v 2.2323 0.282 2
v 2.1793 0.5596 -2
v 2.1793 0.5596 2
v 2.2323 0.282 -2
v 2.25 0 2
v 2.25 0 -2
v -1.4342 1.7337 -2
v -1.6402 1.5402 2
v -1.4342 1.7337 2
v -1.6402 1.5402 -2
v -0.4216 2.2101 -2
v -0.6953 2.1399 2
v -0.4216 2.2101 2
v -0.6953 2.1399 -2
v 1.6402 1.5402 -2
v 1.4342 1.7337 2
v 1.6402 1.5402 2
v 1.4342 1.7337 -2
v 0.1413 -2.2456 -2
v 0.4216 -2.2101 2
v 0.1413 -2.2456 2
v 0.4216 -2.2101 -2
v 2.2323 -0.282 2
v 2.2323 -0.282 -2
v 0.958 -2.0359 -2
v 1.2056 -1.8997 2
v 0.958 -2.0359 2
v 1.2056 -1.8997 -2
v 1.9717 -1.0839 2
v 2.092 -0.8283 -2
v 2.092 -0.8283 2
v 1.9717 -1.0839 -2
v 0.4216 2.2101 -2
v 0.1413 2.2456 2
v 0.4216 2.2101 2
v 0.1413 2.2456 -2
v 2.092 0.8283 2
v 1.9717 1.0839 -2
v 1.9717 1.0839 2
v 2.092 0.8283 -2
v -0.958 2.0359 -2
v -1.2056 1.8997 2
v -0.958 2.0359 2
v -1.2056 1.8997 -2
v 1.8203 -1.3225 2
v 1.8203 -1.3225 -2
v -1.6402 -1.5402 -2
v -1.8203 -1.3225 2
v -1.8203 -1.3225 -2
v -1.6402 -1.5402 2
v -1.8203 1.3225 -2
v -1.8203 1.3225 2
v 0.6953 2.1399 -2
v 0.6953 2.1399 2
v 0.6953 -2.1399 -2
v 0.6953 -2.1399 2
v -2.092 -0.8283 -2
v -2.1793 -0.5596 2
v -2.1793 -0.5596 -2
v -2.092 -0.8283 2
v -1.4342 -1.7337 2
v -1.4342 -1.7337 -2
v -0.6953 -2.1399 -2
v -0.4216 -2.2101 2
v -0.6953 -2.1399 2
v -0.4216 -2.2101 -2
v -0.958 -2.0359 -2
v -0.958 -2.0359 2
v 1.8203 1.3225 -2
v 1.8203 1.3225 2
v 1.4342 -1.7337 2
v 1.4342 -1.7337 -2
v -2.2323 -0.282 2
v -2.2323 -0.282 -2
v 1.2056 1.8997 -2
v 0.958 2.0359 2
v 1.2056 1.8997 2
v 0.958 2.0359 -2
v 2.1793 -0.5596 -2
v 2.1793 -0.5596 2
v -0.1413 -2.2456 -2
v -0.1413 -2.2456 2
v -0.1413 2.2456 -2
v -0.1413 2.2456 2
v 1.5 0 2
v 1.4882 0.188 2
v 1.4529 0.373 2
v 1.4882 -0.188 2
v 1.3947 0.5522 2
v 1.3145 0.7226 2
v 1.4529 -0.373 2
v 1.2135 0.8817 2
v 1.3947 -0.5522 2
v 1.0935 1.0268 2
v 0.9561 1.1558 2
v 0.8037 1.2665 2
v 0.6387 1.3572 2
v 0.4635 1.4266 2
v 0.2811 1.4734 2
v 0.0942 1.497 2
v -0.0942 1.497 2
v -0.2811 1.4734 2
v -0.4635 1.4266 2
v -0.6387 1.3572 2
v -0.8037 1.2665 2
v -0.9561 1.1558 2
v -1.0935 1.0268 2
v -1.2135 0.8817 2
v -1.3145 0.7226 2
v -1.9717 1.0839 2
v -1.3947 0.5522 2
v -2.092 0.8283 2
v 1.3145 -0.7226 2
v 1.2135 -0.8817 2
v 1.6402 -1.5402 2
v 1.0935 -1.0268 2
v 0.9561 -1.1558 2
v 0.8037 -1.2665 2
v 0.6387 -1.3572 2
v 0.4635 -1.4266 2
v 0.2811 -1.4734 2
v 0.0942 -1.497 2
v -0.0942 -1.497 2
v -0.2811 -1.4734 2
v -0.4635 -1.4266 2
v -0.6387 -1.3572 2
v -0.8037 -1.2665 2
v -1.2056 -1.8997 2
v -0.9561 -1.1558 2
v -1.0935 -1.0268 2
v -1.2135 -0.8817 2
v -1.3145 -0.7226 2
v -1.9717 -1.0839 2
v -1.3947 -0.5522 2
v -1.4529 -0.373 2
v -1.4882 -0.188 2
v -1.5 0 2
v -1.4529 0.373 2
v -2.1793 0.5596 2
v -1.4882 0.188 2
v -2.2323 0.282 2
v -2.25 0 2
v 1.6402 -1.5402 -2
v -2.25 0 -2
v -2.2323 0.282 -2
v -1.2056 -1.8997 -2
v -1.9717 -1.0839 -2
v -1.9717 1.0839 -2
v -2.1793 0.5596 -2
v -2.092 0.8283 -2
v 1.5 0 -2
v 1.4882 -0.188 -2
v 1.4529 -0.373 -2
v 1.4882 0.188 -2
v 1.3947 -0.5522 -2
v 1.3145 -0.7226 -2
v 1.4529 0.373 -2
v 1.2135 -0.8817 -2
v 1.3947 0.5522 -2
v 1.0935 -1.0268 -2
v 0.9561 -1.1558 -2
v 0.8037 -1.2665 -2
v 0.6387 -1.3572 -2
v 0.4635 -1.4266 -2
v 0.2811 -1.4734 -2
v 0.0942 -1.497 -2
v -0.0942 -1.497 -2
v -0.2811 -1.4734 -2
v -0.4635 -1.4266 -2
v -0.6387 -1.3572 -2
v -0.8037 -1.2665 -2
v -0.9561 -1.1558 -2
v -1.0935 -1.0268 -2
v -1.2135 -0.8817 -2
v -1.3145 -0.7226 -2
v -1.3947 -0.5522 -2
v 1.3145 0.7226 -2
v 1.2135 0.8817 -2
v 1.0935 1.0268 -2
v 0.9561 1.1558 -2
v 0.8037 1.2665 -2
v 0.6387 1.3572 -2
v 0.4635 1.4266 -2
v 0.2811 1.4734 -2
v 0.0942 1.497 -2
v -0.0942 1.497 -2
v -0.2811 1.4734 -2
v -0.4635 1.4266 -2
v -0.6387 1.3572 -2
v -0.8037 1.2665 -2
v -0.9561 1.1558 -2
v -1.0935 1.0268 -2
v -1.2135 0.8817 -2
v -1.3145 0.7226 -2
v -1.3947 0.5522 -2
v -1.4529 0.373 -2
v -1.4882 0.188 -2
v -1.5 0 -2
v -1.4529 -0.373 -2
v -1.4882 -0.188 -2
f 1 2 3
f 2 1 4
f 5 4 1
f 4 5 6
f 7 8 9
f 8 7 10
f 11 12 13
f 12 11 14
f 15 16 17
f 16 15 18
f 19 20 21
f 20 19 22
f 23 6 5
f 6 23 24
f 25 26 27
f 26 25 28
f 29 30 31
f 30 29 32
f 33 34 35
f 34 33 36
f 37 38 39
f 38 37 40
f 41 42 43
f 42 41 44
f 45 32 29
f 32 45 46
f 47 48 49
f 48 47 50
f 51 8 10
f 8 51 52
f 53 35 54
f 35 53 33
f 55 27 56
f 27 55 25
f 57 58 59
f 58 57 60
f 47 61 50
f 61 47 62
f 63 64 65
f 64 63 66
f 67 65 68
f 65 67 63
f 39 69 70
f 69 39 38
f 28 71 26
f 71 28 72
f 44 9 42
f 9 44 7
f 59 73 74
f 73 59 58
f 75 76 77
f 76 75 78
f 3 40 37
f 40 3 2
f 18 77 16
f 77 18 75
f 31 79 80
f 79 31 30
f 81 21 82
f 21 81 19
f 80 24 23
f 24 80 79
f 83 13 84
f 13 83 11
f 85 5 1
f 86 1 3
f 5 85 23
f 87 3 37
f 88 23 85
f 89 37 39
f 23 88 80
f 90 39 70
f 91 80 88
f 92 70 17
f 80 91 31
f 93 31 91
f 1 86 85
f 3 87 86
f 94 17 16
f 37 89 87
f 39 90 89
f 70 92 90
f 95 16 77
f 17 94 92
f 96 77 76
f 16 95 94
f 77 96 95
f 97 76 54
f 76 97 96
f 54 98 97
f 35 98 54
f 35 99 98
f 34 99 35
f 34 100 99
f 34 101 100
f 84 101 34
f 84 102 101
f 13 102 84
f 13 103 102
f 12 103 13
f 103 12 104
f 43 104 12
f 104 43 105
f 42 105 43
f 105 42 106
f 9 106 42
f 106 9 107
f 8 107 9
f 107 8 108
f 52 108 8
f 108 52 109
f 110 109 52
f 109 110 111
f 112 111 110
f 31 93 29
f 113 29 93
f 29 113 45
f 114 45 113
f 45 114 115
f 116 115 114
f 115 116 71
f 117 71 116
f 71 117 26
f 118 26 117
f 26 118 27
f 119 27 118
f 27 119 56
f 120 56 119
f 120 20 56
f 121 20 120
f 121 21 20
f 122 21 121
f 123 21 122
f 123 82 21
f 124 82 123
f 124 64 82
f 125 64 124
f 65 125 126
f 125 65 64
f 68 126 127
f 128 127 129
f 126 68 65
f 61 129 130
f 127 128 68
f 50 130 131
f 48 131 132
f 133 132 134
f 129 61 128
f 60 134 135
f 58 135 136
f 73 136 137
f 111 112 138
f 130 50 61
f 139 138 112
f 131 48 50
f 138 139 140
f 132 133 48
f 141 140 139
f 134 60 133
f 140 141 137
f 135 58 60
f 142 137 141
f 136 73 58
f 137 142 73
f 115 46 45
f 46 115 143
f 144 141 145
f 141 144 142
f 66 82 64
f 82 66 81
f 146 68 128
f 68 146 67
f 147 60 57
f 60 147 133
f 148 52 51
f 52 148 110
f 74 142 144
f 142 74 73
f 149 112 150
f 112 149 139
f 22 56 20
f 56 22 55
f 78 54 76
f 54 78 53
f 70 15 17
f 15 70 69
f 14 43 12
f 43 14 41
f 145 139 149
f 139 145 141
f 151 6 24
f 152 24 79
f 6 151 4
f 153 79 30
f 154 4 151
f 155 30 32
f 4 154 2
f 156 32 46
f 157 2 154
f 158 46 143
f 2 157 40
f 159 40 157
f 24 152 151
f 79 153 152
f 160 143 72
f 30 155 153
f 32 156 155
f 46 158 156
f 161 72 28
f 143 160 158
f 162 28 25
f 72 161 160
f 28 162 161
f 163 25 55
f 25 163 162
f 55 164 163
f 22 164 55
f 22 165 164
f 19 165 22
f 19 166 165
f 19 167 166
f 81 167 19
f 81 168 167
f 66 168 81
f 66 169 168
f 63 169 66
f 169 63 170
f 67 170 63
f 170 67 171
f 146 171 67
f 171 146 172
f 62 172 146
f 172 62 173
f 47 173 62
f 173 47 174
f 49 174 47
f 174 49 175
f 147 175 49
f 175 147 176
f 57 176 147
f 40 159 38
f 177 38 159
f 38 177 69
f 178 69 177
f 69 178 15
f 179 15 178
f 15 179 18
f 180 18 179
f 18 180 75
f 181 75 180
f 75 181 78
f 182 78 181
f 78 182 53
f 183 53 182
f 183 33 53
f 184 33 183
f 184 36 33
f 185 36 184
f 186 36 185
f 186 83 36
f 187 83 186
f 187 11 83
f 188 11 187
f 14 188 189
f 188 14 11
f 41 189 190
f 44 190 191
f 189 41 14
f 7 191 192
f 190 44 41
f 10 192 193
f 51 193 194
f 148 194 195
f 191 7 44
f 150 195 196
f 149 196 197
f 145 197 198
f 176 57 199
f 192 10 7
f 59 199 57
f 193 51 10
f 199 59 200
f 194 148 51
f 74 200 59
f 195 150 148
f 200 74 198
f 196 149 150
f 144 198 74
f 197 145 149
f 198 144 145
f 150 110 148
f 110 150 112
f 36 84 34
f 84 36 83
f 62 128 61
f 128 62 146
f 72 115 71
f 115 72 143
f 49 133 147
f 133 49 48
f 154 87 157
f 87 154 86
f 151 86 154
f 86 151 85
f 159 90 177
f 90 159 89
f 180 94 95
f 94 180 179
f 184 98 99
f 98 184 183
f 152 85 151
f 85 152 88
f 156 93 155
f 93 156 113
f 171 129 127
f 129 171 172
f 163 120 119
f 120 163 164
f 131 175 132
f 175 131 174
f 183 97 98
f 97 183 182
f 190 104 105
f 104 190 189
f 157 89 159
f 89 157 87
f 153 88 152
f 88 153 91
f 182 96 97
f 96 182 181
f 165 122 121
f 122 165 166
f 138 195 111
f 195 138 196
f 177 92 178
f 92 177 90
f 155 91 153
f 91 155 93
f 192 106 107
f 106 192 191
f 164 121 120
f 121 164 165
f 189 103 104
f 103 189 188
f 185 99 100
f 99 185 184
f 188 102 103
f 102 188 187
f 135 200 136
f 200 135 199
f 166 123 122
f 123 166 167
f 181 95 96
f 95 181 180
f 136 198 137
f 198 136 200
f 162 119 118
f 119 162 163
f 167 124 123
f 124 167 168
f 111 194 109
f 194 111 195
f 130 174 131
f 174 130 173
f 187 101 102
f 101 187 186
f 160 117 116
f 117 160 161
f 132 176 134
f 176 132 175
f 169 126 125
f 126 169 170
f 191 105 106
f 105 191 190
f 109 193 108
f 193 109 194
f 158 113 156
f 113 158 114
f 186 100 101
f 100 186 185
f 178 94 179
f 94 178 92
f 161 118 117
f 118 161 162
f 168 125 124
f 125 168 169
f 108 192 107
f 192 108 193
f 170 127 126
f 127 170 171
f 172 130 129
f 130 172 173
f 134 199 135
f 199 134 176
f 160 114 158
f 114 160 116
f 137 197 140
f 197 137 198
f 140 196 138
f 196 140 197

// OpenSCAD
$fn = 50;


difference() {
	union() {
		translate(v = [0, 0, -2.0000000000]) {
			cylinder(h = 4, r = 2.2500000000);
		}
	}
	union() {
		translate(v = [0, 0, -100.0000000000]) {
			cylinder(h = 200, r = 1.5000000000);
		}
	}
}
